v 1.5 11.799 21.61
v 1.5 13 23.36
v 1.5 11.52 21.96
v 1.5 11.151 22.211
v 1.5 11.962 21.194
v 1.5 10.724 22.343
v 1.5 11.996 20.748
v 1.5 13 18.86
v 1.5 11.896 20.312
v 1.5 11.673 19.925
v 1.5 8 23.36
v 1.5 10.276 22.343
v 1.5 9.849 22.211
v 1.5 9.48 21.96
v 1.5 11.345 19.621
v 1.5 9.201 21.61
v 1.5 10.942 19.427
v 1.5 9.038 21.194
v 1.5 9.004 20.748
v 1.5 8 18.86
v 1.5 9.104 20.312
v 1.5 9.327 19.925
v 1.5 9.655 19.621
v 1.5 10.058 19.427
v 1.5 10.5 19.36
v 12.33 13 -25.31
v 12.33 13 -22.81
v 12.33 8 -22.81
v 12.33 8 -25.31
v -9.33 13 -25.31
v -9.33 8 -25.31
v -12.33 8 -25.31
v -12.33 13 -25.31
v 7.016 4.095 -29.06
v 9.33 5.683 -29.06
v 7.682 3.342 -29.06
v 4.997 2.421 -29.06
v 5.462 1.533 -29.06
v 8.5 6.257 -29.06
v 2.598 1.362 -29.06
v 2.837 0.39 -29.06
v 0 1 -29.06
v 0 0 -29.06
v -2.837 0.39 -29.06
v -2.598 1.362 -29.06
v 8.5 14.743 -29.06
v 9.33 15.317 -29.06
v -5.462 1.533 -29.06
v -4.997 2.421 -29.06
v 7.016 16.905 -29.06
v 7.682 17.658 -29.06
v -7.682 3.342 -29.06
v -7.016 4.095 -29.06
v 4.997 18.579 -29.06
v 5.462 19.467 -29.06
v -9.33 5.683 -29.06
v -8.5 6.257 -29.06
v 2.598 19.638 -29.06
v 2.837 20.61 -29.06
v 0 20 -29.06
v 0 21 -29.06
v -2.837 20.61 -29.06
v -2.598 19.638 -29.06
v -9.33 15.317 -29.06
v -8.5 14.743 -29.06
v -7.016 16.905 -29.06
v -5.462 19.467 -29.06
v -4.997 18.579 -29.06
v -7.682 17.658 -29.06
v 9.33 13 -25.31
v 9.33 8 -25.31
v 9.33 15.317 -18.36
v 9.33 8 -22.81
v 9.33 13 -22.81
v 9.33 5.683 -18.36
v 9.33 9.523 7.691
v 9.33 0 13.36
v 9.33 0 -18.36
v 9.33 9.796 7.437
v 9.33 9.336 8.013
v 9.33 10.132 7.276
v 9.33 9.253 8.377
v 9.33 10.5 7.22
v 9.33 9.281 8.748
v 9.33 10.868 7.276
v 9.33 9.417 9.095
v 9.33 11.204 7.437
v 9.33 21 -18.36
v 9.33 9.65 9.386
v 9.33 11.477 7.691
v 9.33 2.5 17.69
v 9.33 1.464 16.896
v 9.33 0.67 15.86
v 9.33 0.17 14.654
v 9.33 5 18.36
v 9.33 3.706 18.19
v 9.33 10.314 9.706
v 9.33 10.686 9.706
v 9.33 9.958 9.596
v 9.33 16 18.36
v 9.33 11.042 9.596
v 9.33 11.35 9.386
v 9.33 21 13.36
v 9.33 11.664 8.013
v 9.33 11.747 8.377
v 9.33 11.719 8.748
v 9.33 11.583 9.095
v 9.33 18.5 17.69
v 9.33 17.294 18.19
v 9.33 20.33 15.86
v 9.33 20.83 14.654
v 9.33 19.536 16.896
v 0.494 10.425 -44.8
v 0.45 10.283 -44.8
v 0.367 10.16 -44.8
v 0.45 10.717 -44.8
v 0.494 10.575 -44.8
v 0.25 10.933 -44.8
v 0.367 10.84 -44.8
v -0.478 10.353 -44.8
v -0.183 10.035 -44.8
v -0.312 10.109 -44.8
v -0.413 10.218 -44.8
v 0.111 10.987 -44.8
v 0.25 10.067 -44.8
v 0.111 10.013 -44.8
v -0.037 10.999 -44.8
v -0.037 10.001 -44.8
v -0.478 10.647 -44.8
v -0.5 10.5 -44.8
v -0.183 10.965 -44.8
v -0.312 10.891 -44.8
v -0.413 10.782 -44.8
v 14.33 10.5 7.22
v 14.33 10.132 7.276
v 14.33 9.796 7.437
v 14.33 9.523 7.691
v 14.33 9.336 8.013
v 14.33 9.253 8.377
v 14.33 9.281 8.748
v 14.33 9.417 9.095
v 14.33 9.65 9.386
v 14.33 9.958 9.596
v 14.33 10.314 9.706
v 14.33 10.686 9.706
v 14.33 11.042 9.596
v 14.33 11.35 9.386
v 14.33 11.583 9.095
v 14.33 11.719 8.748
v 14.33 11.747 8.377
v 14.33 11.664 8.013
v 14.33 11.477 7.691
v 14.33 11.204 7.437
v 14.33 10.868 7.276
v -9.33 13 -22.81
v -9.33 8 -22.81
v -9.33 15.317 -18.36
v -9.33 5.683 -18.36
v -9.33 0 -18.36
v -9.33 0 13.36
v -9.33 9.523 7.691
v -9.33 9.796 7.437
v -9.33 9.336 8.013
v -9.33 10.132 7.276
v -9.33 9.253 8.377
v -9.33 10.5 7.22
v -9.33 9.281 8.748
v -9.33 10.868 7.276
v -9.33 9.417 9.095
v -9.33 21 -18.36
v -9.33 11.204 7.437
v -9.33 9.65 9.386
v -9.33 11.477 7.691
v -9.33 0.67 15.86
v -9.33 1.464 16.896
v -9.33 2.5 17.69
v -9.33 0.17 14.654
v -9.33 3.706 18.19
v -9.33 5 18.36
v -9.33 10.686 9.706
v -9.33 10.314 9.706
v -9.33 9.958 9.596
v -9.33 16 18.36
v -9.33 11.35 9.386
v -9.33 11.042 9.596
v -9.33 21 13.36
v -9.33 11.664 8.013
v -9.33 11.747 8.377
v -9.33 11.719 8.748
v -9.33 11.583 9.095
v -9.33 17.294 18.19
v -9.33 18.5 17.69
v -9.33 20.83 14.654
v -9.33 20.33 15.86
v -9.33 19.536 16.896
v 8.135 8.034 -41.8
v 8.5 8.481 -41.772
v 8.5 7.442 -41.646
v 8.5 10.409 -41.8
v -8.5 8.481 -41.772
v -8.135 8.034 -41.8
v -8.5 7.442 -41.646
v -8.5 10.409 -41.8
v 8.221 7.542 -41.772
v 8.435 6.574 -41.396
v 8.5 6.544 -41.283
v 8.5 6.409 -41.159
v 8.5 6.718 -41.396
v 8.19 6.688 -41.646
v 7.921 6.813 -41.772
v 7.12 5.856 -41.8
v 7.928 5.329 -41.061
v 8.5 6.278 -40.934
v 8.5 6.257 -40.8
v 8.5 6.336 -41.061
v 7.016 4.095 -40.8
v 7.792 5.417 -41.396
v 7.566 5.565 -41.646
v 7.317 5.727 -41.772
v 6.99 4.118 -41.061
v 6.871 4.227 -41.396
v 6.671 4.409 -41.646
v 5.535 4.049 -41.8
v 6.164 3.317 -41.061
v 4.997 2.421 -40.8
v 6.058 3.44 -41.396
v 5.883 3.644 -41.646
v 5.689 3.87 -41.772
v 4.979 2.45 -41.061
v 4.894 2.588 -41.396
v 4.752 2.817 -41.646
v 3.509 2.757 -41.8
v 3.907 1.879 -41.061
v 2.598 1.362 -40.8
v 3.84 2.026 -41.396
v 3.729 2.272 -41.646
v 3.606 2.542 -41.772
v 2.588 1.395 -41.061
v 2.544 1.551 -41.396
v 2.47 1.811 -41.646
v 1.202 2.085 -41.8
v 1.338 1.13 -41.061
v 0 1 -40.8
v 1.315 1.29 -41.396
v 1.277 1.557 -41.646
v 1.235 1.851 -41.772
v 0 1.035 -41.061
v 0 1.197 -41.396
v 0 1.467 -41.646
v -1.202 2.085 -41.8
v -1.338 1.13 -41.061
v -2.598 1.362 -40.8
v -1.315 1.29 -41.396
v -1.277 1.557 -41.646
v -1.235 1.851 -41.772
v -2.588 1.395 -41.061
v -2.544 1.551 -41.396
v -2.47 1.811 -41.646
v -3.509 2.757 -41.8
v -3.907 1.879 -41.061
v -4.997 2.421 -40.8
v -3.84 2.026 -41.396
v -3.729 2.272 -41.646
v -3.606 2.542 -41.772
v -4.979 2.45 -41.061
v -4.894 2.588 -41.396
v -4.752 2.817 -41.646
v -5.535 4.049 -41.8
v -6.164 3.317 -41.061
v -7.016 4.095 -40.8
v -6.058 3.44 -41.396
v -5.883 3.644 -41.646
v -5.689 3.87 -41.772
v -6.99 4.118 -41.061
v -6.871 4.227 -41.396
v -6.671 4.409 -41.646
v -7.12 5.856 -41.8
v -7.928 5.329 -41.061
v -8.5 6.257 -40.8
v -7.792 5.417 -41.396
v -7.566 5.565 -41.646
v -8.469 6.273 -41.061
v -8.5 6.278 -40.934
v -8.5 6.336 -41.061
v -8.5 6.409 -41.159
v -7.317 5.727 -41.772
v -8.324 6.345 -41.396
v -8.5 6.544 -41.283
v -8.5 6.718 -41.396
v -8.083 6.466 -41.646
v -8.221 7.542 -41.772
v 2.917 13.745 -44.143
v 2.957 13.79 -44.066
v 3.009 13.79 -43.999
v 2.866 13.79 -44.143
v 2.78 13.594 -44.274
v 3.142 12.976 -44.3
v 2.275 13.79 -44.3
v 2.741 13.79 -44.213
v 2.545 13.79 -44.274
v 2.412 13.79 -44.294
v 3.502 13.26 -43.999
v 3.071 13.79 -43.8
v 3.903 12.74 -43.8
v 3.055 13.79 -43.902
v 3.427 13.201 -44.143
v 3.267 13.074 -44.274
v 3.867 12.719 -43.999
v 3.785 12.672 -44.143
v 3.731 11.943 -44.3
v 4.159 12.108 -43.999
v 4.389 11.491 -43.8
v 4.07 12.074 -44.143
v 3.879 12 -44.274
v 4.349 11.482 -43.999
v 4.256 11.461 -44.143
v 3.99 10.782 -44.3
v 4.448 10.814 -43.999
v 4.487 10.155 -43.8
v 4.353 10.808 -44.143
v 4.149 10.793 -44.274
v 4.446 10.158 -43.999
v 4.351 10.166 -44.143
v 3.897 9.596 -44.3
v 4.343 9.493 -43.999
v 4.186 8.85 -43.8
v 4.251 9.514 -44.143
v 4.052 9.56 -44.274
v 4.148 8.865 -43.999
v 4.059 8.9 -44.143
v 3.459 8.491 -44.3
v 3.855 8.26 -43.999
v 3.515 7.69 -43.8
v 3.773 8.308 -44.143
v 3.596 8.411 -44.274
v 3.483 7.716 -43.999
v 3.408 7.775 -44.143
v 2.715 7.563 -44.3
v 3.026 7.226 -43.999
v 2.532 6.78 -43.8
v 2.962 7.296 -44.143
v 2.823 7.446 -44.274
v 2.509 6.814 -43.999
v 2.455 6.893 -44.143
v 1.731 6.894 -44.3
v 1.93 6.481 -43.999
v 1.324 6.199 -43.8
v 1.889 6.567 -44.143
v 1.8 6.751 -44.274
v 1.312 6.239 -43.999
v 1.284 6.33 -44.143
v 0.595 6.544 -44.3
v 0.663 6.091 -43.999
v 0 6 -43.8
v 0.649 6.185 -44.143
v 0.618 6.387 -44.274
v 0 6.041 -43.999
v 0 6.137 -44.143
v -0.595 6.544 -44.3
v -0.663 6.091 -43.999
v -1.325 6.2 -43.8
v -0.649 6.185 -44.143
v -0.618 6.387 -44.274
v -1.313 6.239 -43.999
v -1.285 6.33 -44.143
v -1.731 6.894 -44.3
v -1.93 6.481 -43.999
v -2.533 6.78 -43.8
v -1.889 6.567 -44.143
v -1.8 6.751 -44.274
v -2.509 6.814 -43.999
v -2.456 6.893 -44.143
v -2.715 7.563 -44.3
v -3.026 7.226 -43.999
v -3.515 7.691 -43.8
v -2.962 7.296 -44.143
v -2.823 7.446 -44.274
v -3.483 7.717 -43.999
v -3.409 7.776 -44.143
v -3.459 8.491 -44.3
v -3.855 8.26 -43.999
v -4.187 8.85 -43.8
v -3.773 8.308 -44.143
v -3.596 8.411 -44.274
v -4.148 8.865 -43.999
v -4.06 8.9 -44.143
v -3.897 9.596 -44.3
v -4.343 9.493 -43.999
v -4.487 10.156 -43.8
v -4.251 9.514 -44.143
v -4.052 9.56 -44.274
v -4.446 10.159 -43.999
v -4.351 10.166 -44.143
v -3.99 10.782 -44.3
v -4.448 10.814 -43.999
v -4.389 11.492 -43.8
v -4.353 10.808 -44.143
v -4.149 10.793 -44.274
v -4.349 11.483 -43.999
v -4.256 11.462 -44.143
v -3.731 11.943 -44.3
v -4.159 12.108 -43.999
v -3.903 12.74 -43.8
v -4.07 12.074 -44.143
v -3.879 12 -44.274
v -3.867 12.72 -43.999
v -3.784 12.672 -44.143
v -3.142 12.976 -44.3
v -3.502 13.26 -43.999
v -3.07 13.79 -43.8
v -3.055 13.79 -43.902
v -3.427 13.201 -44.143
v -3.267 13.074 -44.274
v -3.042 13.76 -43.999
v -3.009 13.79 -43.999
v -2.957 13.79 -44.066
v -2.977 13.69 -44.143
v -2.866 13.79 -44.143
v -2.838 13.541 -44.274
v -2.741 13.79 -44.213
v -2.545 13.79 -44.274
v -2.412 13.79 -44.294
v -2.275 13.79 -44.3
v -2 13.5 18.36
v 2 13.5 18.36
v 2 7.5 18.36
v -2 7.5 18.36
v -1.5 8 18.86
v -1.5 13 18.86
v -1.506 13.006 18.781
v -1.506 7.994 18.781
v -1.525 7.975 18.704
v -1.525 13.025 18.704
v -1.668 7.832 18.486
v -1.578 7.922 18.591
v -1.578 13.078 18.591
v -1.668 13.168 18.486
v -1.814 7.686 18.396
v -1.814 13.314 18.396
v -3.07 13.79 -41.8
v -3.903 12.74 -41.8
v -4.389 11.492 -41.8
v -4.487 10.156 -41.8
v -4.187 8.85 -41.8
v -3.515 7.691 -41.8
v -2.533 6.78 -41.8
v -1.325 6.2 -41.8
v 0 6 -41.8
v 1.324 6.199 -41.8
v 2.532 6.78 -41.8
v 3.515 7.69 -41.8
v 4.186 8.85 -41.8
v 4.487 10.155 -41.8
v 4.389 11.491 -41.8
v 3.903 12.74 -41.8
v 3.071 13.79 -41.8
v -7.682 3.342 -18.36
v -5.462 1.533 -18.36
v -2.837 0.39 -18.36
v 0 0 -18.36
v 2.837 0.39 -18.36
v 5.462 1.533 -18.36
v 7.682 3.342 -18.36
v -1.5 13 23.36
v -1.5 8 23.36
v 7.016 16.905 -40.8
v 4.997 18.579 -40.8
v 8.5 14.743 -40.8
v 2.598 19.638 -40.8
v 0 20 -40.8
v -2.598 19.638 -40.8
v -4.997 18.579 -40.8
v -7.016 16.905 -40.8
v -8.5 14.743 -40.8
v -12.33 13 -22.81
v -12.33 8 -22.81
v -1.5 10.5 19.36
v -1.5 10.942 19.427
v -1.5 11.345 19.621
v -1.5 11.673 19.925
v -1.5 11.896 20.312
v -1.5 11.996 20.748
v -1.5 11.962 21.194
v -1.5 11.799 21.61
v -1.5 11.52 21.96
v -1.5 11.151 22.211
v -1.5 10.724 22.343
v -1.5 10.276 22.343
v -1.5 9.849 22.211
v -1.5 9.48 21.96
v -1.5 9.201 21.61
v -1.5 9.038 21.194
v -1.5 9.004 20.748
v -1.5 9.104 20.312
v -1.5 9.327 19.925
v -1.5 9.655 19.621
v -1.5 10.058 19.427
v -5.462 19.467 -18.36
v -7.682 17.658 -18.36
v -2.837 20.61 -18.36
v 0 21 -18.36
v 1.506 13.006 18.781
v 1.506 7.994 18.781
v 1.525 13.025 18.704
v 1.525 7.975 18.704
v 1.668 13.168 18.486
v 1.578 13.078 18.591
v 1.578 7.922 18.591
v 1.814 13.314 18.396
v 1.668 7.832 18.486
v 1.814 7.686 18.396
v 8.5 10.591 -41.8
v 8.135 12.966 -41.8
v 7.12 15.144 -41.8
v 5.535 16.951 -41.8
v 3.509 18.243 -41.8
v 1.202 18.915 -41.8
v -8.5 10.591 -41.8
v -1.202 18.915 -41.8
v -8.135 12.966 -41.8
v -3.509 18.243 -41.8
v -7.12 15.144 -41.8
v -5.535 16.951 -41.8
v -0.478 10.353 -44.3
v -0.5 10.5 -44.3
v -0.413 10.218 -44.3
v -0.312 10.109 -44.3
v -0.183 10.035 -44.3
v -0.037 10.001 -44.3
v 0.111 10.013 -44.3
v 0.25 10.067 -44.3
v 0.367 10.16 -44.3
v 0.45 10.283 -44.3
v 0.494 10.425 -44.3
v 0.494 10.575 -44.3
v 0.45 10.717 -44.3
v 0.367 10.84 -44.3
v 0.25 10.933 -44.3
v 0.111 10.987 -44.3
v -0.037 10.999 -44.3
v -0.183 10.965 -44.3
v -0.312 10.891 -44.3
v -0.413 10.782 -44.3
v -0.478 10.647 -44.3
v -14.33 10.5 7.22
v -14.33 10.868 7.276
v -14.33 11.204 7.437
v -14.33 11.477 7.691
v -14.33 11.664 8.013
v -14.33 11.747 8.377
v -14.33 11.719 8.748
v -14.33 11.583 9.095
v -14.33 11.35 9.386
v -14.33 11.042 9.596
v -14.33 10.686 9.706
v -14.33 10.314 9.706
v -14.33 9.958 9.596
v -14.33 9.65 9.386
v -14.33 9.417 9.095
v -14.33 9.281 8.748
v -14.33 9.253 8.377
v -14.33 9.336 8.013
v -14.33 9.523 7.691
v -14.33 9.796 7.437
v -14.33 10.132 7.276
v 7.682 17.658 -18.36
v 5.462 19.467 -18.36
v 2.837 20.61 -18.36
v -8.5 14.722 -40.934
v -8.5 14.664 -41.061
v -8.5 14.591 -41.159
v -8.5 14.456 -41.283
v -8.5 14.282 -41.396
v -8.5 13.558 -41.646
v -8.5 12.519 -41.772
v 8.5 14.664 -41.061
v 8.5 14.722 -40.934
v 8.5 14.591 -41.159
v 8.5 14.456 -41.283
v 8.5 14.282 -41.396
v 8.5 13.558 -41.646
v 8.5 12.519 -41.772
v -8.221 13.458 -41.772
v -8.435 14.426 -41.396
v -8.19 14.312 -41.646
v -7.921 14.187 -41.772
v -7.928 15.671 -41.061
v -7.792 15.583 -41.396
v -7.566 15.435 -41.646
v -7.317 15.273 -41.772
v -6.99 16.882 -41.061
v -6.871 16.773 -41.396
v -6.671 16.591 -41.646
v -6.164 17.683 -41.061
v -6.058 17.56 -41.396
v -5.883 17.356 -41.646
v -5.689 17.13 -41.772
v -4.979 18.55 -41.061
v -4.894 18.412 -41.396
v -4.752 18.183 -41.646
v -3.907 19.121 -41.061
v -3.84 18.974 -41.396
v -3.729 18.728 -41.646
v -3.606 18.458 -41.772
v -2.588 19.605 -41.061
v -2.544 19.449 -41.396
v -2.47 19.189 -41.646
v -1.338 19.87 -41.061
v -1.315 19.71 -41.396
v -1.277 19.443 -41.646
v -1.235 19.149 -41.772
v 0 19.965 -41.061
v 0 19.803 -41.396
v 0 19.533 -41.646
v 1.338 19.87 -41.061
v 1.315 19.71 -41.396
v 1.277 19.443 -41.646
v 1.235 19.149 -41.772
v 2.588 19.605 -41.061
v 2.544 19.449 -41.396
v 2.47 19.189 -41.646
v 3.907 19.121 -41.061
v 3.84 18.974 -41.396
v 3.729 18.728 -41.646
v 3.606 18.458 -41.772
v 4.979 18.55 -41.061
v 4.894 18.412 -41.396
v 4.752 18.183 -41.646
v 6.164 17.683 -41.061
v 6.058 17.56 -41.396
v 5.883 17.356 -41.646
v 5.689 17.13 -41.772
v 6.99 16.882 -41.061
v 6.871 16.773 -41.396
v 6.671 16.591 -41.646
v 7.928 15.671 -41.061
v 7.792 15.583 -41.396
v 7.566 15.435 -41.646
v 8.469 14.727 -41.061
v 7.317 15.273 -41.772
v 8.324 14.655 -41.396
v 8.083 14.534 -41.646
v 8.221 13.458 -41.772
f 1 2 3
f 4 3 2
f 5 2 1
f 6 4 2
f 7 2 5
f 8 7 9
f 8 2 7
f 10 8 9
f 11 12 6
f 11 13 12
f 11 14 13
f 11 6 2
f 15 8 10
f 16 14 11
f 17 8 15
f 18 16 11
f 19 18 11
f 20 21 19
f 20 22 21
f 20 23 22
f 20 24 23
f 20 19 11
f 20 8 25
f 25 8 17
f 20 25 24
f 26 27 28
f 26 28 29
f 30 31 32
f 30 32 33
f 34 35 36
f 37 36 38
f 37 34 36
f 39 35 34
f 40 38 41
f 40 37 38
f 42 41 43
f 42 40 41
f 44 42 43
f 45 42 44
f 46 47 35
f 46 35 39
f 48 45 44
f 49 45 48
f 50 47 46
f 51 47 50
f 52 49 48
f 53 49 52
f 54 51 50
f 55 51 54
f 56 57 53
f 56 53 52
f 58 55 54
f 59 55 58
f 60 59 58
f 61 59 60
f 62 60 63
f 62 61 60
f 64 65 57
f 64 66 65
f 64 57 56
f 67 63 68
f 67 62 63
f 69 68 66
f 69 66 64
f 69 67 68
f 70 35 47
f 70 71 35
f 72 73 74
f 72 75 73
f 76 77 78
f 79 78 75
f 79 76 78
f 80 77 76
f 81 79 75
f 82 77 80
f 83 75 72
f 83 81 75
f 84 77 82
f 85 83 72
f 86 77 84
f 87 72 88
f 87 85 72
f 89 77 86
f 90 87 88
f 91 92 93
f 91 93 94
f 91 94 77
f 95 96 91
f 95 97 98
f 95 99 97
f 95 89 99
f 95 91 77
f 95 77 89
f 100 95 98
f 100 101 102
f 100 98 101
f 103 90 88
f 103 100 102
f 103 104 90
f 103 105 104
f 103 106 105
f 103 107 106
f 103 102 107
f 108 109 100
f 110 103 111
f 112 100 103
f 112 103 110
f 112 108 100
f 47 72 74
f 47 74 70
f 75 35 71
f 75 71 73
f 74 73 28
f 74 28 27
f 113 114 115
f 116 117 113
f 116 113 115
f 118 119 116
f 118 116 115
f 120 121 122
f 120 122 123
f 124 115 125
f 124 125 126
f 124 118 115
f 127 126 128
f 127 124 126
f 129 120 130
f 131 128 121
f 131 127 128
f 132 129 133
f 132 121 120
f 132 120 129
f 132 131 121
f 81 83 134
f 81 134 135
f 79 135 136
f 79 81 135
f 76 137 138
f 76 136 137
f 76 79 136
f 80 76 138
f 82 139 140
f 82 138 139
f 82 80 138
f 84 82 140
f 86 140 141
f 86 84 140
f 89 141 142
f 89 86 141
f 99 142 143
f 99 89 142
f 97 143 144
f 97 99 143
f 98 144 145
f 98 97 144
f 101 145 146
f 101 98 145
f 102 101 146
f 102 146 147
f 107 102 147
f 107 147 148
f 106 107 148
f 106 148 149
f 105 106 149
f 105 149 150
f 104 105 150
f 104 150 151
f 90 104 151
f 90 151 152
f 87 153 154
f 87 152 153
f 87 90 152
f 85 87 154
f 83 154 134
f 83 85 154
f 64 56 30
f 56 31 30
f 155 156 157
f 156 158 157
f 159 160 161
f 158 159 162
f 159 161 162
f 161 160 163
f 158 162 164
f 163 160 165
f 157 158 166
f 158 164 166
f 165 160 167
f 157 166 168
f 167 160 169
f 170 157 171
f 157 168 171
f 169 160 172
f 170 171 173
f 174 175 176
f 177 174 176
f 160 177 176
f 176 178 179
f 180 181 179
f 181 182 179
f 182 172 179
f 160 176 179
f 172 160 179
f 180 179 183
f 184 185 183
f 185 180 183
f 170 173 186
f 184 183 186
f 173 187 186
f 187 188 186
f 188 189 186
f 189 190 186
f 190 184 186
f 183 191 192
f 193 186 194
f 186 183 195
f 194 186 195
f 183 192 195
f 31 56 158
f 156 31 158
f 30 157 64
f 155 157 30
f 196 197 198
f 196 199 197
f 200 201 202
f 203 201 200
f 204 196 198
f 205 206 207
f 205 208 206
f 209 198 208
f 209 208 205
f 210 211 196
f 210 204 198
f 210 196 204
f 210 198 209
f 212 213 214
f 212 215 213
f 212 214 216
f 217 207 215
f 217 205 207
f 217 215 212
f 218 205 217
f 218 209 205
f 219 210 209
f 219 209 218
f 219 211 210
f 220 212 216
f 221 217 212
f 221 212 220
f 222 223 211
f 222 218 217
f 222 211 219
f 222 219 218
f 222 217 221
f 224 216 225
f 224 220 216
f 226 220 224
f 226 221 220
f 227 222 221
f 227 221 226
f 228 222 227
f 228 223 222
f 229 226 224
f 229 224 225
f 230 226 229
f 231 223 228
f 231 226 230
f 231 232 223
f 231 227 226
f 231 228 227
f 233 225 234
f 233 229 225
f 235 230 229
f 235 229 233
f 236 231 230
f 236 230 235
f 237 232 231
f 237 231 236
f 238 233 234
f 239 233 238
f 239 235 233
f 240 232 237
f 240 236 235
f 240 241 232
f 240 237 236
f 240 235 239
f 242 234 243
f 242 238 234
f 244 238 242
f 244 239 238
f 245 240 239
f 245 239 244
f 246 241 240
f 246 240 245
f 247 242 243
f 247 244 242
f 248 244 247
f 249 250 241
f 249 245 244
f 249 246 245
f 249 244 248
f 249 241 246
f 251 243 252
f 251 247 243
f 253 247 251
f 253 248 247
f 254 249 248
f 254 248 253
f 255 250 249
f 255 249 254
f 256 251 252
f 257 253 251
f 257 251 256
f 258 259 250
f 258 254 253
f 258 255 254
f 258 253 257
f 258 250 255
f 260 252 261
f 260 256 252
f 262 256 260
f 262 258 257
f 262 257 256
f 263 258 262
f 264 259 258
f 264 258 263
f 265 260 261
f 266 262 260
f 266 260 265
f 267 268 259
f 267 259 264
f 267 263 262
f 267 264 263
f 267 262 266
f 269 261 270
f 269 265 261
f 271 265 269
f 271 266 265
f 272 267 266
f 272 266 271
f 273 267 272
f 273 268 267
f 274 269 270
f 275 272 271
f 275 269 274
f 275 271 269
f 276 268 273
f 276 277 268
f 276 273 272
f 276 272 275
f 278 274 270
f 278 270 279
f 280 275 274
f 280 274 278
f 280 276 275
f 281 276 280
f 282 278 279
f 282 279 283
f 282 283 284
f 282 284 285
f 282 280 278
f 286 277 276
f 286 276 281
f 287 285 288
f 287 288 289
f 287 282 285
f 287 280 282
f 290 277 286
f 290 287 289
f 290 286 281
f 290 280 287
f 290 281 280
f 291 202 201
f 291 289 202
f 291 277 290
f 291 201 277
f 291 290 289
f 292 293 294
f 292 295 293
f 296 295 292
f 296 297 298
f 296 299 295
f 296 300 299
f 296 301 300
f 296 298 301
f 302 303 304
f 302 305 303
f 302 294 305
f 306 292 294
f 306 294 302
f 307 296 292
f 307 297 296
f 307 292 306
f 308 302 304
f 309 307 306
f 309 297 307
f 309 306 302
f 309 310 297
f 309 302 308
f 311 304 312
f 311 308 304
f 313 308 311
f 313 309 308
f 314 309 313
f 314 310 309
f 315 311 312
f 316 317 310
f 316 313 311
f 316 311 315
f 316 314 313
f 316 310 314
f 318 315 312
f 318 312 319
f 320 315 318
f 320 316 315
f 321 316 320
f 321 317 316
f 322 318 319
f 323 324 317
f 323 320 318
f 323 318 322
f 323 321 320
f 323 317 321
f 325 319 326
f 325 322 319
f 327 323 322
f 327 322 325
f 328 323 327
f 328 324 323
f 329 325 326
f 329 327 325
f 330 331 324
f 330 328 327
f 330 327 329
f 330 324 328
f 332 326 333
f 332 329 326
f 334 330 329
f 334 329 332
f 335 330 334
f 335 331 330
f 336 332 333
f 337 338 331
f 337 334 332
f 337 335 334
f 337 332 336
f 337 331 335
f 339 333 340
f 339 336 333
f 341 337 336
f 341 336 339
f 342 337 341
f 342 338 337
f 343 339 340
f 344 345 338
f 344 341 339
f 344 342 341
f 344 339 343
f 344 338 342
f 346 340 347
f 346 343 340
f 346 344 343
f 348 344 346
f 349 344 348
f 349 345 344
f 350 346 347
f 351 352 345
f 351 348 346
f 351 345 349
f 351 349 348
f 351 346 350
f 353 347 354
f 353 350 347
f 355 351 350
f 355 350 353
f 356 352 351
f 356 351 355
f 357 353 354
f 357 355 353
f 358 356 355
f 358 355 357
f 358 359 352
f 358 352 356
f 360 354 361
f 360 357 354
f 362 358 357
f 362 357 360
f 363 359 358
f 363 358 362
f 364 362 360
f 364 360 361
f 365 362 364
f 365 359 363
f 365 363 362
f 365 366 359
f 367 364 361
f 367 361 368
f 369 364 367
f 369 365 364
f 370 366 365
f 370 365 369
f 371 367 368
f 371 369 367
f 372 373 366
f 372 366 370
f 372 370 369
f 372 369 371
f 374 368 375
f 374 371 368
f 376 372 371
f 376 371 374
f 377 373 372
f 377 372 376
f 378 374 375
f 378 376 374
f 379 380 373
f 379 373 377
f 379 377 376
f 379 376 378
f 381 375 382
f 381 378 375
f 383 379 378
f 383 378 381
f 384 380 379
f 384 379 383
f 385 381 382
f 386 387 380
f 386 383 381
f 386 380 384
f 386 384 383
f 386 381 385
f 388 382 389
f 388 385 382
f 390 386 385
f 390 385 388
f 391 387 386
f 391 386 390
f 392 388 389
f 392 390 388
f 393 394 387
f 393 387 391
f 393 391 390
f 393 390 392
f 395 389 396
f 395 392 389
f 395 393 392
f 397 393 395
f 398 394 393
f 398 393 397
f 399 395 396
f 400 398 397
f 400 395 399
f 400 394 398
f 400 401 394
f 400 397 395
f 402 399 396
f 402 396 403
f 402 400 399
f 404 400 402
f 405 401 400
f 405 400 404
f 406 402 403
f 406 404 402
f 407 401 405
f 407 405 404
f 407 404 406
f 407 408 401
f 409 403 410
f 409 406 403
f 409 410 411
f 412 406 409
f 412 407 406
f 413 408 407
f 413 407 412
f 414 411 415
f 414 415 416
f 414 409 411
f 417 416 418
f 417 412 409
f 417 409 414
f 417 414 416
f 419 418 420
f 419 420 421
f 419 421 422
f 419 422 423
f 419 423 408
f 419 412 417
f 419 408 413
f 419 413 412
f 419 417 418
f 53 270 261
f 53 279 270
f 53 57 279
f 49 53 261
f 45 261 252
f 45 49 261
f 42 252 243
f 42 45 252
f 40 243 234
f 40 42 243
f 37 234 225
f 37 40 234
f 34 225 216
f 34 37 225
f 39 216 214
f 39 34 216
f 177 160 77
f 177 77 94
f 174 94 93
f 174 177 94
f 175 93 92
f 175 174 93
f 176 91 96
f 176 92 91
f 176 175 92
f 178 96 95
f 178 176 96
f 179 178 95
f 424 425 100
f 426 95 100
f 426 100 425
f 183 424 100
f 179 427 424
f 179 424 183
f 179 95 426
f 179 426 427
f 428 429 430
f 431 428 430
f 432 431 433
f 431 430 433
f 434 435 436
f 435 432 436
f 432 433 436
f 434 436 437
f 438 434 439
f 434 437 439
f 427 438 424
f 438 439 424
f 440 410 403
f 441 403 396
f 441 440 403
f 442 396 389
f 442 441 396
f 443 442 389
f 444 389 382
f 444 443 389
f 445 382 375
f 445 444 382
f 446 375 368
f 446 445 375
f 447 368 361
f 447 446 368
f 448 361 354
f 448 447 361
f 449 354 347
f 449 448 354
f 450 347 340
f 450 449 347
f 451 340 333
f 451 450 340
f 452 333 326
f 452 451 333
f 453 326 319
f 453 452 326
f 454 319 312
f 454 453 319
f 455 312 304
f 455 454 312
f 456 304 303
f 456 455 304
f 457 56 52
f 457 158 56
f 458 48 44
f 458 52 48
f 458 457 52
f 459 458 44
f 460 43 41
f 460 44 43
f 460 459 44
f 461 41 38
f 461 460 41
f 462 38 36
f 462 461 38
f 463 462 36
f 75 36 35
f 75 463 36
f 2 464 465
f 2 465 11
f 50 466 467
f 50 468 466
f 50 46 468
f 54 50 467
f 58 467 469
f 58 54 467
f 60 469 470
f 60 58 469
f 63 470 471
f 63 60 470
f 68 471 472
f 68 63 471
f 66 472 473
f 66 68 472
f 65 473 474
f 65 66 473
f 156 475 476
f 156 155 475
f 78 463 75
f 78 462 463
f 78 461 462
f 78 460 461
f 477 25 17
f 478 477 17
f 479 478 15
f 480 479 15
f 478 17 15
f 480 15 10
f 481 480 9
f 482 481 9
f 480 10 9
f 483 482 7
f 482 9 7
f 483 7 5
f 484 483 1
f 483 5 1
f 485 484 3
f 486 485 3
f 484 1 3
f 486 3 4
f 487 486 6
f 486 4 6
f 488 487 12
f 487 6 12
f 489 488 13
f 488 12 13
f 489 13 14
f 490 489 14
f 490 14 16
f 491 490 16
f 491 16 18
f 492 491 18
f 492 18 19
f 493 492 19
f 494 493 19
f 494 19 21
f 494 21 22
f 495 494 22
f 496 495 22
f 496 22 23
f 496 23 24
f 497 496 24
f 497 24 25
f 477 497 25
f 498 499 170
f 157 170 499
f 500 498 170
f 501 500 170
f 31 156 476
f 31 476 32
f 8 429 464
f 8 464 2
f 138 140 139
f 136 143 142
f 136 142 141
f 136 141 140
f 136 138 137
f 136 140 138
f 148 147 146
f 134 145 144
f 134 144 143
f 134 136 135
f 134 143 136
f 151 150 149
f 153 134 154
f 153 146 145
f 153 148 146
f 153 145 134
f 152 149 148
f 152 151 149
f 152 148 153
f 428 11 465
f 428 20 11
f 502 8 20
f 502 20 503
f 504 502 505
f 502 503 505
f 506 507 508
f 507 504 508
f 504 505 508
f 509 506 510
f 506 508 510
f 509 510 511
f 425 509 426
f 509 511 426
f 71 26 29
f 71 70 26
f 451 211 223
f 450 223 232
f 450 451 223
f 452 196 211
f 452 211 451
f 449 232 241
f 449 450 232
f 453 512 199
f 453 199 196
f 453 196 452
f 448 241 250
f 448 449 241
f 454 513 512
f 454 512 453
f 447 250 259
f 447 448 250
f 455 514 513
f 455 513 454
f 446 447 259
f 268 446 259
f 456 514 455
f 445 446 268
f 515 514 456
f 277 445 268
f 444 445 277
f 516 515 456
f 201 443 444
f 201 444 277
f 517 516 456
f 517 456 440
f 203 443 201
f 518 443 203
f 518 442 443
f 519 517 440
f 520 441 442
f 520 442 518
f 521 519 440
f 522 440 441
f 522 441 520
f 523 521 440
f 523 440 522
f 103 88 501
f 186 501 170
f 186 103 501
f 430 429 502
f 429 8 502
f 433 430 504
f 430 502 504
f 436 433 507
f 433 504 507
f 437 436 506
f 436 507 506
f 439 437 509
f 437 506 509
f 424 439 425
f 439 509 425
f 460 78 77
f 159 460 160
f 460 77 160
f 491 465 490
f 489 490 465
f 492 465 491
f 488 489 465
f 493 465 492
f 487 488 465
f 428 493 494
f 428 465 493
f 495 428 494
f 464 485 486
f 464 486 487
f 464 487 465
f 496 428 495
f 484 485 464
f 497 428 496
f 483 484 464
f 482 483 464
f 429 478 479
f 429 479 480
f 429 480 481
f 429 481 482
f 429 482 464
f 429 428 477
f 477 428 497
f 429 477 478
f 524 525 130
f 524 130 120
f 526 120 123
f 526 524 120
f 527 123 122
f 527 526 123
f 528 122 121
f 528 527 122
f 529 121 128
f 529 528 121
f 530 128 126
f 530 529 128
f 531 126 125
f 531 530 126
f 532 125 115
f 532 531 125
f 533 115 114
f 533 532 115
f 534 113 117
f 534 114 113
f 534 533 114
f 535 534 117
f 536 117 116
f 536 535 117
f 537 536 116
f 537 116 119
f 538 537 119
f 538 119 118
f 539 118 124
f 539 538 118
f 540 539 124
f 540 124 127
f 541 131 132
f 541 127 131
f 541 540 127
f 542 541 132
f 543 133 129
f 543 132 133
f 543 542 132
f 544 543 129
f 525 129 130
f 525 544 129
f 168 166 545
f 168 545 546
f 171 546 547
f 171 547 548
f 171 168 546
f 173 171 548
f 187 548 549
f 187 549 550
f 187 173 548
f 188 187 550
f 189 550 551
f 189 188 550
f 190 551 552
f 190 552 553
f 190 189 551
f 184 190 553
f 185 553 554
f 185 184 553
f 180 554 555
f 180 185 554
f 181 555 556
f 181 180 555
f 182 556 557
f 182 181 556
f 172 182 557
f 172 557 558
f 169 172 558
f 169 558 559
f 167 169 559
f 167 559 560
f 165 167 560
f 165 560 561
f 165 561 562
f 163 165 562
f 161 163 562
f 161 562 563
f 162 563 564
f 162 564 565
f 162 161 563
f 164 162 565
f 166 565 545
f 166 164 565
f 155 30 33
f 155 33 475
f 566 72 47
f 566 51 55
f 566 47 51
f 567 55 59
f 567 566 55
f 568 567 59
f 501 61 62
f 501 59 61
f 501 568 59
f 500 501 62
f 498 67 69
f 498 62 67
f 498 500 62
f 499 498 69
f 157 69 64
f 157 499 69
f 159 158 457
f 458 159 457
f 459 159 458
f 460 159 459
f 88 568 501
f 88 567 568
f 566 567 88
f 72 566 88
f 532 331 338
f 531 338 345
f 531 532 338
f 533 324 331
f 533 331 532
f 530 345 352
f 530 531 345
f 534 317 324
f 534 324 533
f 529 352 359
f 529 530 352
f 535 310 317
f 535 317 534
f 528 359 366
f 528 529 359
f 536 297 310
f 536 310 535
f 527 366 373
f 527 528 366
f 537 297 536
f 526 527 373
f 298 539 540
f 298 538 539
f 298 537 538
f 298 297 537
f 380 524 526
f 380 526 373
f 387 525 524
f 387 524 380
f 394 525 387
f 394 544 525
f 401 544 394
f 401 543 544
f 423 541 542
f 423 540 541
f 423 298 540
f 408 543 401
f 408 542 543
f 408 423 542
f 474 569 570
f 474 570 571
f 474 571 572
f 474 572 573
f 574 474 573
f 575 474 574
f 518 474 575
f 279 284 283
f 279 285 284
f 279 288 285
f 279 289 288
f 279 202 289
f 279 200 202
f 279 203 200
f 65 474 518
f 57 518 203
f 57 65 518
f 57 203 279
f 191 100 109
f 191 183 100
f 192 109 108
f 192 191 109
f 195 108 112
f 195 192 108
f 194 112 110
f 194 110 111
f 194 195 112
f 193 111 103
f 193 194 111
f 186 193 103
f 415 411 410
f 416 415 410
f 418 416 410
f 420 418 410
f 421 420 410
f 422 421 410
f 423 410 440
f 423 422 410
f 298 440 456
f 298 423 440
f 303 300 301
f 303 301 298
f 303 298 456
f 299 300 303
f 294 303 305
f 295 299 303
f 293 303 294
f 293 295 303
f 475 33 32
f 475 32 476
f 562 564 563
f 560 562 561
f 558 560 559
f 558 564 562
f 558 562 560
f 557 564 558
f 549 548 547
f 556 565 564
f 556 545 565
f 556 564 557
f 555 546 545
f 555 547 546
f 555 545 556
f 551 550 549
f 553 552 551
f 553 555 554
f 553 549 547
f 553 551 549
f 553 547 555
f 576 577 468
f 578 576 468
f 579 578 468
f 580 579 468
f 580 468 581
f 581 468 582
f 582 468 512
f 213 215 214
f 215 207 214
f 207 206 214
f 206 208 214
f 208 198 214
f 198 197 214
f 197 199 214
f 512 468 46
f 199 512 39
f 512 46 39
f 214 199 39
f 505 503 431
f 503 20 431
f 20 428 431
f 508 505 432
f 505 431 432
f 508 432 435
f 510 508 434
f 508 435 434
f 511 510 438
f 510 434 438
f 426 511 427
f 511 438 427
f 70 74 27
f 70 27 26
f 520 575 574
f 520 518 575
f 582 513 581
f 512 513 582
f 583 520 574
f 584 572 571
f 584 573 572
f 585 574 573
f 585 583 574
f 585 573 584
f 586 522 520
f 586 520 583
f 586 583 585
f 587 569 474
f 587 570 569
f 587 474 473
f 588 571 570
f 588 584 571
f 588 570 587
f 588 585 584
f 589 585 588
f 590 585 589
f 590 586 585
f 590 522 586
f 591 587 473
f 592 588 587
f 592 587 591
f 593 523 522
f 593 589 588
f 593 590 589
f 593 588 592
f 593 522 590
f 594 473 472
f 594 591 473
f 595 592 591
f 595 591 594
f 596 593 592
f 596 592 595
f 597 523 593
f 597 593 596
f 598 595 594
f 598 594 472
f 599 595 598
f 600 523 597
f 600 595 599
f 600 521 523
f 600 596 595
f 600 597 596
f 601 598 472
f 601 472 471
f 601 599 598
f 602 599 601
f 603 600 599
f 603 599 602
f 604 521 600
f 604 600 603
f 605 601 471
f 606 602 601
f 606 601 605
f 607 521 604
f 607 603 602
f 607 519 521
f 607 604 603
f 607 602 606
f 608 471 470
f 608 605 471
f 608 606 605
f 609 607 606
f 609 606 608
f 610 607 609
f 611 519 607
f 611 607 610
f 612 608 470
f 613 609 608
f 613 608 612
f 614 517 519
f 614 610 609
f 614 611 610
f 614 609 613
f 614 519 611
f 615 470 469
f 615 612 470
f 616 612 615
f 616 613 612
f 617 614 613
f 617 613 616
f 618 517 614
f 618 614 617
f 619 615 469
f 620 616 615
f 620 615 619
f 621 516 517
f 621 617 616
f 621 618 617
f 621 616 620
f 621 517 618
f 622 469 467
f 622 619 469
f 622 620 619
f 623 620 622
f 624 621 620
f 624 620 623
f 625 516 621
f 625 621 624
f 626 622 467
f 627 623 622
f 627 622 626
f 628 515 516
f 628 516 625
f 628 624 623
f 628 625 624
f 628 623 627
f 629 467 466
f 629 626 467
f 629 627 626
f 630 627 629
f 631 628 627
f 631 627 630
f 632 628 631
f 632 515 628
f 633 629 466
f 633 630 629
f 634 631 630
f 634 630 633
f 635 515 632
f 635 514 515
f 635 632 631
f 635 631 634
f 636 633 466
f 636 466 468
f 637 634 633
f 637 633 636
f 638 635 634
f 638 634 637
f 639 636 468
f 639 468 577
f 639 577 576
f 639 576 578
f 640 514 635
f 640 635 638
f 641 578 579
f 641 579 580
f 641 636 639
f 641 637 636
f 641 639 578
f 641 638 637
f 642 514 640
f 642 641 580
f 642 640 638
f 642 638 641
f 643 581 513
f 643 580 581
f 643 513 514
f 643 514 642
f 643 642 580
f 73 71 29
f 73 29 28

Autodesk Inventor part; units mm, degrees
ref_plane "YZ Plane" through (0, 0, 0) normal (1, 0, 0) x (0, 1, 0)
ref_plane "XZ Plane" through (0, 0, 0) normal (0, 1, 0) x (-1, 0, 0)
ref_plane "XY Plane" through (0, 0, 0) normal (0, 0, 1) x (1, 0, 0)
sketch "Sketch1" plane through (0, 0, 0) normal (0, 1, 0) x (-1, 0, 0)
  line L0 (-9.33, 18.36) -> (9.33, 18.36)
  line L1 (9.33, 18.36) -> (9.33, -18.36)
  line L2 (9.33, -18.36) -> (-9.33, -18.36)
  line L3 (-9.33, -18.36) -> (-9.33, 18.36)
  line L4 (9.33, 18.36) -> (-9.33, -18.36) construction
  point P0 (0, 0)
extrude "Extrusion1" add sketch "Sketch1" along normal blind 21
fillet "Fillet1" radius 5 2 edges at (0, 21, 18.36) (0, 0, 18.36)
sketch "Sketch2" plane through (9.33, 0, -18.36) normal (0, 0, -1) x (-1, 0, 0)
  circle A0 centre (9.33, 10.5) radius 10.5
  point P0 (9.33, 0)
extrude "Extrusion2" add sketch "Sketch2" along normal blind 10.7
sketch "Sketch3" plane through (9.33, 0, -18.36) normal (0, 0, 1) x (1, 0, 0)
  line L0 (0, 5.6832) -> (0, 15.3168) projected
  arc A0 (0, 5.6832) -> (0, 15.3168) centre (-9.33, 10.5) ccw projected
  line L1 (-18.66, 5.6832) -> (-18.66, 15.3168) projected
  arc A1 (-18.66, 15.3168) -> (-18.66, 5.6832) centre (-9.33, 10.5) ccw projected
  point P0 (-9.33, 0)
extrude "Extrusion3" cut sketch "Sketch3" against normal blind 10.7
sketch "Sketch4" plane through (9.33, 0, 13.36) normal (1, 0, 0) x (0, 0, -1)
  line L0 (36.17, 13) -> (38.67, 13)
  line L1 (38.67, 13) -> (38.67, 8)
  line L2 (38.67, 8) -> (36.17, 8)
  line L3 (36.17, 8) -> (36.17, 13)
  point P0 (13.36, 0)
extrude "Extrusion4" add sketch "Sketch4" along normal blind 3
mirror "Mirror1" about plane through (0, 0, 0) normal (1, 0, 0) of "Extrusion4"
sketch "Sketch5" plane through (9.33, 0, -29.06) normal (0, 0, -1) x (-1, 0, 0)
  arc A0 (18.66, 15.3168) -> (0, 15.3168) centre (9.33, 10.5) ccw projected
  line L0 (0.83, 10.5) -> (0.83, 14.7426)
  line L1 (0.83, 10.5) -> (0.83, 6.2574)
  line L2 (9.33, 10.5) -> (9.33, 11.5651)
  line L3 (17.83, 10.5) -> (17.83, 14.7426)
  line L4 (17.83, 10.5) -> (17.83, 6.2574)
  arc A1 (17.83, 14.7426) -> (0.83, 14.7426) centre (9.33, 10.5) ccw
  arc A2 (0.83, 6.2574) -> (17.83, 6.2574) centre (9.33, 10.5) ccw
  point P0 (9.33, 0)
  point P1 (0.83, 15.6468)
  point P2 (0.83, 5.1568)
  point P3 (17.83, 15.6468)
  point P4 (17.83, 5.1568)
extrude "Extrusion5" add sketch "Sketch5" along normal blind 12.74
fillet "Fillet2" radius 1 2 edges at (0, 20, -41.8) (0, 1, -41.8)
sketch "Sketch6" plane through (9.33, 0, -41.8) normal (0, 0, -1) x (-1, 0, 0)
  arc A0 (17.83, 10.5) -> (0.83, 10.5) centre (9.33, 10.5) ccw projected
  circle A1 centre (9.33, 10.5) radius 4.5
  point P0 (9.33, 0)
  dimension "d20" = 9
extrude "Extrusion6" add sketch "Sketch6" along normal blind 2.5
fillet "Fillet3" radius 0.5 1 edges at (4.5, 10.5, -44.3)
sketch "Sketch7" plane through (0, 10.5, -44.3) normal (0, 0, -1) x (-1, 0, 0)
  circle A0 centre (0, 0) radius 4 projected
  circle A1 centre (0, 0) radius 4.5 projected
  circle A2 centre (0, 0) radius 4 projected
  line L0 (-3.0711, 4.7099) -> (3.07, 4.7099)
  line L1 (3.07, 4.7099) -> (3.07, 3.2901)
  line L2 (3.07, 3.2901) -> (-3.0711, 3.2901)
  line L3 (-3.0711, 3.2901) -> (-3.0711, 4.7099)
  line L4 (-3.0711, 4.7099) -> (3.07, 3.2901) construction
  line L5 (3.07, 4.7099) -> (-3.0711, 3.2901) construction
  point P0 (0, -10.5)
  point P1 (-0.0005, 4)
extrude "Extrusion7" cut sketch "Sketch7" against normal blind 2.5 contours L2 A0 | A0 L2 A1 | A1 L3 L0 L1 picked at (0.4734, 3.4399) picked at (1.9981, 3.6326)
sketch "Sketch8" plane through (9.33, 0, -44.3) normal (0, 0, -1) x (-1, 0, 0)
  arc A0 (7.0551, 13.7901) -> (11.6049, 13.7901) centre (9.33, 10.5) ccw projected
  circle A1 centre (9.33, 10.5) radius 0.5
  point P0 (9.33, 0)
  dimension "d26" = 1
extrude "Extrusion8" add sketch "Sketch8" along normal blind 0.5
sketch "Sketch9" plane through (-9.33, 5, 18.36) normal (0, 0, 1) x (1, 0, 0)
  line L0 (7.83, 8) -> (10.83, 8)
  line L1 (10.83, 8) -> (10.83, 3)
  line L2 (10.83, 3) -> (7.83, 3)
  line L3 (7.83, 3) -> (7.83, 8)
  line L4 (7.83, 8) -> (10.83, 3) construction
  line L5 (10.83, 8) -> (7.83, 3) construction
  point P0 (9.33, -5)
  point P1 (9.33, 5.5)
  dimension "d29" = 3
  dimension "d30" = 5
extrude "Extrusion9" add sketch "Sketch9" along normal blind 5
sketch "Sketch10" plane through (1.5, 8, 18.36) normal (1, 0, 0) x (0, 0, -1)
  circle A0 centre (-2.5, 2.5) radius 1.5
  point P0 (18.36, -8)
  dimension "d33" = 3
extrude "Extrusion10" cut sketch "Sketch10" against normal blind 5
fillet "Fillet4" radius 0.5 4 edges at (1.5, 10.5, 18.36) (0, 13, 18.36) (-1.5, 10.5, 18.36) (0, 8, 18.36)
sketch "Sketch11" plane through (9.33, 0, 13.36) normal (1, 0, 0) x (0, 0, -1)
  circle A0 centre (4.89, 10.5) radius 1.25
  point P0 (13.36, 0)
extrude "Extrusion11" add sketch "Sketch11" along normal blind 5
mirror "Mirror3" about plane through (0, 0, 0) normal (1, 0, 0) of "Extrusion11"
properties part number "motor_dc"
